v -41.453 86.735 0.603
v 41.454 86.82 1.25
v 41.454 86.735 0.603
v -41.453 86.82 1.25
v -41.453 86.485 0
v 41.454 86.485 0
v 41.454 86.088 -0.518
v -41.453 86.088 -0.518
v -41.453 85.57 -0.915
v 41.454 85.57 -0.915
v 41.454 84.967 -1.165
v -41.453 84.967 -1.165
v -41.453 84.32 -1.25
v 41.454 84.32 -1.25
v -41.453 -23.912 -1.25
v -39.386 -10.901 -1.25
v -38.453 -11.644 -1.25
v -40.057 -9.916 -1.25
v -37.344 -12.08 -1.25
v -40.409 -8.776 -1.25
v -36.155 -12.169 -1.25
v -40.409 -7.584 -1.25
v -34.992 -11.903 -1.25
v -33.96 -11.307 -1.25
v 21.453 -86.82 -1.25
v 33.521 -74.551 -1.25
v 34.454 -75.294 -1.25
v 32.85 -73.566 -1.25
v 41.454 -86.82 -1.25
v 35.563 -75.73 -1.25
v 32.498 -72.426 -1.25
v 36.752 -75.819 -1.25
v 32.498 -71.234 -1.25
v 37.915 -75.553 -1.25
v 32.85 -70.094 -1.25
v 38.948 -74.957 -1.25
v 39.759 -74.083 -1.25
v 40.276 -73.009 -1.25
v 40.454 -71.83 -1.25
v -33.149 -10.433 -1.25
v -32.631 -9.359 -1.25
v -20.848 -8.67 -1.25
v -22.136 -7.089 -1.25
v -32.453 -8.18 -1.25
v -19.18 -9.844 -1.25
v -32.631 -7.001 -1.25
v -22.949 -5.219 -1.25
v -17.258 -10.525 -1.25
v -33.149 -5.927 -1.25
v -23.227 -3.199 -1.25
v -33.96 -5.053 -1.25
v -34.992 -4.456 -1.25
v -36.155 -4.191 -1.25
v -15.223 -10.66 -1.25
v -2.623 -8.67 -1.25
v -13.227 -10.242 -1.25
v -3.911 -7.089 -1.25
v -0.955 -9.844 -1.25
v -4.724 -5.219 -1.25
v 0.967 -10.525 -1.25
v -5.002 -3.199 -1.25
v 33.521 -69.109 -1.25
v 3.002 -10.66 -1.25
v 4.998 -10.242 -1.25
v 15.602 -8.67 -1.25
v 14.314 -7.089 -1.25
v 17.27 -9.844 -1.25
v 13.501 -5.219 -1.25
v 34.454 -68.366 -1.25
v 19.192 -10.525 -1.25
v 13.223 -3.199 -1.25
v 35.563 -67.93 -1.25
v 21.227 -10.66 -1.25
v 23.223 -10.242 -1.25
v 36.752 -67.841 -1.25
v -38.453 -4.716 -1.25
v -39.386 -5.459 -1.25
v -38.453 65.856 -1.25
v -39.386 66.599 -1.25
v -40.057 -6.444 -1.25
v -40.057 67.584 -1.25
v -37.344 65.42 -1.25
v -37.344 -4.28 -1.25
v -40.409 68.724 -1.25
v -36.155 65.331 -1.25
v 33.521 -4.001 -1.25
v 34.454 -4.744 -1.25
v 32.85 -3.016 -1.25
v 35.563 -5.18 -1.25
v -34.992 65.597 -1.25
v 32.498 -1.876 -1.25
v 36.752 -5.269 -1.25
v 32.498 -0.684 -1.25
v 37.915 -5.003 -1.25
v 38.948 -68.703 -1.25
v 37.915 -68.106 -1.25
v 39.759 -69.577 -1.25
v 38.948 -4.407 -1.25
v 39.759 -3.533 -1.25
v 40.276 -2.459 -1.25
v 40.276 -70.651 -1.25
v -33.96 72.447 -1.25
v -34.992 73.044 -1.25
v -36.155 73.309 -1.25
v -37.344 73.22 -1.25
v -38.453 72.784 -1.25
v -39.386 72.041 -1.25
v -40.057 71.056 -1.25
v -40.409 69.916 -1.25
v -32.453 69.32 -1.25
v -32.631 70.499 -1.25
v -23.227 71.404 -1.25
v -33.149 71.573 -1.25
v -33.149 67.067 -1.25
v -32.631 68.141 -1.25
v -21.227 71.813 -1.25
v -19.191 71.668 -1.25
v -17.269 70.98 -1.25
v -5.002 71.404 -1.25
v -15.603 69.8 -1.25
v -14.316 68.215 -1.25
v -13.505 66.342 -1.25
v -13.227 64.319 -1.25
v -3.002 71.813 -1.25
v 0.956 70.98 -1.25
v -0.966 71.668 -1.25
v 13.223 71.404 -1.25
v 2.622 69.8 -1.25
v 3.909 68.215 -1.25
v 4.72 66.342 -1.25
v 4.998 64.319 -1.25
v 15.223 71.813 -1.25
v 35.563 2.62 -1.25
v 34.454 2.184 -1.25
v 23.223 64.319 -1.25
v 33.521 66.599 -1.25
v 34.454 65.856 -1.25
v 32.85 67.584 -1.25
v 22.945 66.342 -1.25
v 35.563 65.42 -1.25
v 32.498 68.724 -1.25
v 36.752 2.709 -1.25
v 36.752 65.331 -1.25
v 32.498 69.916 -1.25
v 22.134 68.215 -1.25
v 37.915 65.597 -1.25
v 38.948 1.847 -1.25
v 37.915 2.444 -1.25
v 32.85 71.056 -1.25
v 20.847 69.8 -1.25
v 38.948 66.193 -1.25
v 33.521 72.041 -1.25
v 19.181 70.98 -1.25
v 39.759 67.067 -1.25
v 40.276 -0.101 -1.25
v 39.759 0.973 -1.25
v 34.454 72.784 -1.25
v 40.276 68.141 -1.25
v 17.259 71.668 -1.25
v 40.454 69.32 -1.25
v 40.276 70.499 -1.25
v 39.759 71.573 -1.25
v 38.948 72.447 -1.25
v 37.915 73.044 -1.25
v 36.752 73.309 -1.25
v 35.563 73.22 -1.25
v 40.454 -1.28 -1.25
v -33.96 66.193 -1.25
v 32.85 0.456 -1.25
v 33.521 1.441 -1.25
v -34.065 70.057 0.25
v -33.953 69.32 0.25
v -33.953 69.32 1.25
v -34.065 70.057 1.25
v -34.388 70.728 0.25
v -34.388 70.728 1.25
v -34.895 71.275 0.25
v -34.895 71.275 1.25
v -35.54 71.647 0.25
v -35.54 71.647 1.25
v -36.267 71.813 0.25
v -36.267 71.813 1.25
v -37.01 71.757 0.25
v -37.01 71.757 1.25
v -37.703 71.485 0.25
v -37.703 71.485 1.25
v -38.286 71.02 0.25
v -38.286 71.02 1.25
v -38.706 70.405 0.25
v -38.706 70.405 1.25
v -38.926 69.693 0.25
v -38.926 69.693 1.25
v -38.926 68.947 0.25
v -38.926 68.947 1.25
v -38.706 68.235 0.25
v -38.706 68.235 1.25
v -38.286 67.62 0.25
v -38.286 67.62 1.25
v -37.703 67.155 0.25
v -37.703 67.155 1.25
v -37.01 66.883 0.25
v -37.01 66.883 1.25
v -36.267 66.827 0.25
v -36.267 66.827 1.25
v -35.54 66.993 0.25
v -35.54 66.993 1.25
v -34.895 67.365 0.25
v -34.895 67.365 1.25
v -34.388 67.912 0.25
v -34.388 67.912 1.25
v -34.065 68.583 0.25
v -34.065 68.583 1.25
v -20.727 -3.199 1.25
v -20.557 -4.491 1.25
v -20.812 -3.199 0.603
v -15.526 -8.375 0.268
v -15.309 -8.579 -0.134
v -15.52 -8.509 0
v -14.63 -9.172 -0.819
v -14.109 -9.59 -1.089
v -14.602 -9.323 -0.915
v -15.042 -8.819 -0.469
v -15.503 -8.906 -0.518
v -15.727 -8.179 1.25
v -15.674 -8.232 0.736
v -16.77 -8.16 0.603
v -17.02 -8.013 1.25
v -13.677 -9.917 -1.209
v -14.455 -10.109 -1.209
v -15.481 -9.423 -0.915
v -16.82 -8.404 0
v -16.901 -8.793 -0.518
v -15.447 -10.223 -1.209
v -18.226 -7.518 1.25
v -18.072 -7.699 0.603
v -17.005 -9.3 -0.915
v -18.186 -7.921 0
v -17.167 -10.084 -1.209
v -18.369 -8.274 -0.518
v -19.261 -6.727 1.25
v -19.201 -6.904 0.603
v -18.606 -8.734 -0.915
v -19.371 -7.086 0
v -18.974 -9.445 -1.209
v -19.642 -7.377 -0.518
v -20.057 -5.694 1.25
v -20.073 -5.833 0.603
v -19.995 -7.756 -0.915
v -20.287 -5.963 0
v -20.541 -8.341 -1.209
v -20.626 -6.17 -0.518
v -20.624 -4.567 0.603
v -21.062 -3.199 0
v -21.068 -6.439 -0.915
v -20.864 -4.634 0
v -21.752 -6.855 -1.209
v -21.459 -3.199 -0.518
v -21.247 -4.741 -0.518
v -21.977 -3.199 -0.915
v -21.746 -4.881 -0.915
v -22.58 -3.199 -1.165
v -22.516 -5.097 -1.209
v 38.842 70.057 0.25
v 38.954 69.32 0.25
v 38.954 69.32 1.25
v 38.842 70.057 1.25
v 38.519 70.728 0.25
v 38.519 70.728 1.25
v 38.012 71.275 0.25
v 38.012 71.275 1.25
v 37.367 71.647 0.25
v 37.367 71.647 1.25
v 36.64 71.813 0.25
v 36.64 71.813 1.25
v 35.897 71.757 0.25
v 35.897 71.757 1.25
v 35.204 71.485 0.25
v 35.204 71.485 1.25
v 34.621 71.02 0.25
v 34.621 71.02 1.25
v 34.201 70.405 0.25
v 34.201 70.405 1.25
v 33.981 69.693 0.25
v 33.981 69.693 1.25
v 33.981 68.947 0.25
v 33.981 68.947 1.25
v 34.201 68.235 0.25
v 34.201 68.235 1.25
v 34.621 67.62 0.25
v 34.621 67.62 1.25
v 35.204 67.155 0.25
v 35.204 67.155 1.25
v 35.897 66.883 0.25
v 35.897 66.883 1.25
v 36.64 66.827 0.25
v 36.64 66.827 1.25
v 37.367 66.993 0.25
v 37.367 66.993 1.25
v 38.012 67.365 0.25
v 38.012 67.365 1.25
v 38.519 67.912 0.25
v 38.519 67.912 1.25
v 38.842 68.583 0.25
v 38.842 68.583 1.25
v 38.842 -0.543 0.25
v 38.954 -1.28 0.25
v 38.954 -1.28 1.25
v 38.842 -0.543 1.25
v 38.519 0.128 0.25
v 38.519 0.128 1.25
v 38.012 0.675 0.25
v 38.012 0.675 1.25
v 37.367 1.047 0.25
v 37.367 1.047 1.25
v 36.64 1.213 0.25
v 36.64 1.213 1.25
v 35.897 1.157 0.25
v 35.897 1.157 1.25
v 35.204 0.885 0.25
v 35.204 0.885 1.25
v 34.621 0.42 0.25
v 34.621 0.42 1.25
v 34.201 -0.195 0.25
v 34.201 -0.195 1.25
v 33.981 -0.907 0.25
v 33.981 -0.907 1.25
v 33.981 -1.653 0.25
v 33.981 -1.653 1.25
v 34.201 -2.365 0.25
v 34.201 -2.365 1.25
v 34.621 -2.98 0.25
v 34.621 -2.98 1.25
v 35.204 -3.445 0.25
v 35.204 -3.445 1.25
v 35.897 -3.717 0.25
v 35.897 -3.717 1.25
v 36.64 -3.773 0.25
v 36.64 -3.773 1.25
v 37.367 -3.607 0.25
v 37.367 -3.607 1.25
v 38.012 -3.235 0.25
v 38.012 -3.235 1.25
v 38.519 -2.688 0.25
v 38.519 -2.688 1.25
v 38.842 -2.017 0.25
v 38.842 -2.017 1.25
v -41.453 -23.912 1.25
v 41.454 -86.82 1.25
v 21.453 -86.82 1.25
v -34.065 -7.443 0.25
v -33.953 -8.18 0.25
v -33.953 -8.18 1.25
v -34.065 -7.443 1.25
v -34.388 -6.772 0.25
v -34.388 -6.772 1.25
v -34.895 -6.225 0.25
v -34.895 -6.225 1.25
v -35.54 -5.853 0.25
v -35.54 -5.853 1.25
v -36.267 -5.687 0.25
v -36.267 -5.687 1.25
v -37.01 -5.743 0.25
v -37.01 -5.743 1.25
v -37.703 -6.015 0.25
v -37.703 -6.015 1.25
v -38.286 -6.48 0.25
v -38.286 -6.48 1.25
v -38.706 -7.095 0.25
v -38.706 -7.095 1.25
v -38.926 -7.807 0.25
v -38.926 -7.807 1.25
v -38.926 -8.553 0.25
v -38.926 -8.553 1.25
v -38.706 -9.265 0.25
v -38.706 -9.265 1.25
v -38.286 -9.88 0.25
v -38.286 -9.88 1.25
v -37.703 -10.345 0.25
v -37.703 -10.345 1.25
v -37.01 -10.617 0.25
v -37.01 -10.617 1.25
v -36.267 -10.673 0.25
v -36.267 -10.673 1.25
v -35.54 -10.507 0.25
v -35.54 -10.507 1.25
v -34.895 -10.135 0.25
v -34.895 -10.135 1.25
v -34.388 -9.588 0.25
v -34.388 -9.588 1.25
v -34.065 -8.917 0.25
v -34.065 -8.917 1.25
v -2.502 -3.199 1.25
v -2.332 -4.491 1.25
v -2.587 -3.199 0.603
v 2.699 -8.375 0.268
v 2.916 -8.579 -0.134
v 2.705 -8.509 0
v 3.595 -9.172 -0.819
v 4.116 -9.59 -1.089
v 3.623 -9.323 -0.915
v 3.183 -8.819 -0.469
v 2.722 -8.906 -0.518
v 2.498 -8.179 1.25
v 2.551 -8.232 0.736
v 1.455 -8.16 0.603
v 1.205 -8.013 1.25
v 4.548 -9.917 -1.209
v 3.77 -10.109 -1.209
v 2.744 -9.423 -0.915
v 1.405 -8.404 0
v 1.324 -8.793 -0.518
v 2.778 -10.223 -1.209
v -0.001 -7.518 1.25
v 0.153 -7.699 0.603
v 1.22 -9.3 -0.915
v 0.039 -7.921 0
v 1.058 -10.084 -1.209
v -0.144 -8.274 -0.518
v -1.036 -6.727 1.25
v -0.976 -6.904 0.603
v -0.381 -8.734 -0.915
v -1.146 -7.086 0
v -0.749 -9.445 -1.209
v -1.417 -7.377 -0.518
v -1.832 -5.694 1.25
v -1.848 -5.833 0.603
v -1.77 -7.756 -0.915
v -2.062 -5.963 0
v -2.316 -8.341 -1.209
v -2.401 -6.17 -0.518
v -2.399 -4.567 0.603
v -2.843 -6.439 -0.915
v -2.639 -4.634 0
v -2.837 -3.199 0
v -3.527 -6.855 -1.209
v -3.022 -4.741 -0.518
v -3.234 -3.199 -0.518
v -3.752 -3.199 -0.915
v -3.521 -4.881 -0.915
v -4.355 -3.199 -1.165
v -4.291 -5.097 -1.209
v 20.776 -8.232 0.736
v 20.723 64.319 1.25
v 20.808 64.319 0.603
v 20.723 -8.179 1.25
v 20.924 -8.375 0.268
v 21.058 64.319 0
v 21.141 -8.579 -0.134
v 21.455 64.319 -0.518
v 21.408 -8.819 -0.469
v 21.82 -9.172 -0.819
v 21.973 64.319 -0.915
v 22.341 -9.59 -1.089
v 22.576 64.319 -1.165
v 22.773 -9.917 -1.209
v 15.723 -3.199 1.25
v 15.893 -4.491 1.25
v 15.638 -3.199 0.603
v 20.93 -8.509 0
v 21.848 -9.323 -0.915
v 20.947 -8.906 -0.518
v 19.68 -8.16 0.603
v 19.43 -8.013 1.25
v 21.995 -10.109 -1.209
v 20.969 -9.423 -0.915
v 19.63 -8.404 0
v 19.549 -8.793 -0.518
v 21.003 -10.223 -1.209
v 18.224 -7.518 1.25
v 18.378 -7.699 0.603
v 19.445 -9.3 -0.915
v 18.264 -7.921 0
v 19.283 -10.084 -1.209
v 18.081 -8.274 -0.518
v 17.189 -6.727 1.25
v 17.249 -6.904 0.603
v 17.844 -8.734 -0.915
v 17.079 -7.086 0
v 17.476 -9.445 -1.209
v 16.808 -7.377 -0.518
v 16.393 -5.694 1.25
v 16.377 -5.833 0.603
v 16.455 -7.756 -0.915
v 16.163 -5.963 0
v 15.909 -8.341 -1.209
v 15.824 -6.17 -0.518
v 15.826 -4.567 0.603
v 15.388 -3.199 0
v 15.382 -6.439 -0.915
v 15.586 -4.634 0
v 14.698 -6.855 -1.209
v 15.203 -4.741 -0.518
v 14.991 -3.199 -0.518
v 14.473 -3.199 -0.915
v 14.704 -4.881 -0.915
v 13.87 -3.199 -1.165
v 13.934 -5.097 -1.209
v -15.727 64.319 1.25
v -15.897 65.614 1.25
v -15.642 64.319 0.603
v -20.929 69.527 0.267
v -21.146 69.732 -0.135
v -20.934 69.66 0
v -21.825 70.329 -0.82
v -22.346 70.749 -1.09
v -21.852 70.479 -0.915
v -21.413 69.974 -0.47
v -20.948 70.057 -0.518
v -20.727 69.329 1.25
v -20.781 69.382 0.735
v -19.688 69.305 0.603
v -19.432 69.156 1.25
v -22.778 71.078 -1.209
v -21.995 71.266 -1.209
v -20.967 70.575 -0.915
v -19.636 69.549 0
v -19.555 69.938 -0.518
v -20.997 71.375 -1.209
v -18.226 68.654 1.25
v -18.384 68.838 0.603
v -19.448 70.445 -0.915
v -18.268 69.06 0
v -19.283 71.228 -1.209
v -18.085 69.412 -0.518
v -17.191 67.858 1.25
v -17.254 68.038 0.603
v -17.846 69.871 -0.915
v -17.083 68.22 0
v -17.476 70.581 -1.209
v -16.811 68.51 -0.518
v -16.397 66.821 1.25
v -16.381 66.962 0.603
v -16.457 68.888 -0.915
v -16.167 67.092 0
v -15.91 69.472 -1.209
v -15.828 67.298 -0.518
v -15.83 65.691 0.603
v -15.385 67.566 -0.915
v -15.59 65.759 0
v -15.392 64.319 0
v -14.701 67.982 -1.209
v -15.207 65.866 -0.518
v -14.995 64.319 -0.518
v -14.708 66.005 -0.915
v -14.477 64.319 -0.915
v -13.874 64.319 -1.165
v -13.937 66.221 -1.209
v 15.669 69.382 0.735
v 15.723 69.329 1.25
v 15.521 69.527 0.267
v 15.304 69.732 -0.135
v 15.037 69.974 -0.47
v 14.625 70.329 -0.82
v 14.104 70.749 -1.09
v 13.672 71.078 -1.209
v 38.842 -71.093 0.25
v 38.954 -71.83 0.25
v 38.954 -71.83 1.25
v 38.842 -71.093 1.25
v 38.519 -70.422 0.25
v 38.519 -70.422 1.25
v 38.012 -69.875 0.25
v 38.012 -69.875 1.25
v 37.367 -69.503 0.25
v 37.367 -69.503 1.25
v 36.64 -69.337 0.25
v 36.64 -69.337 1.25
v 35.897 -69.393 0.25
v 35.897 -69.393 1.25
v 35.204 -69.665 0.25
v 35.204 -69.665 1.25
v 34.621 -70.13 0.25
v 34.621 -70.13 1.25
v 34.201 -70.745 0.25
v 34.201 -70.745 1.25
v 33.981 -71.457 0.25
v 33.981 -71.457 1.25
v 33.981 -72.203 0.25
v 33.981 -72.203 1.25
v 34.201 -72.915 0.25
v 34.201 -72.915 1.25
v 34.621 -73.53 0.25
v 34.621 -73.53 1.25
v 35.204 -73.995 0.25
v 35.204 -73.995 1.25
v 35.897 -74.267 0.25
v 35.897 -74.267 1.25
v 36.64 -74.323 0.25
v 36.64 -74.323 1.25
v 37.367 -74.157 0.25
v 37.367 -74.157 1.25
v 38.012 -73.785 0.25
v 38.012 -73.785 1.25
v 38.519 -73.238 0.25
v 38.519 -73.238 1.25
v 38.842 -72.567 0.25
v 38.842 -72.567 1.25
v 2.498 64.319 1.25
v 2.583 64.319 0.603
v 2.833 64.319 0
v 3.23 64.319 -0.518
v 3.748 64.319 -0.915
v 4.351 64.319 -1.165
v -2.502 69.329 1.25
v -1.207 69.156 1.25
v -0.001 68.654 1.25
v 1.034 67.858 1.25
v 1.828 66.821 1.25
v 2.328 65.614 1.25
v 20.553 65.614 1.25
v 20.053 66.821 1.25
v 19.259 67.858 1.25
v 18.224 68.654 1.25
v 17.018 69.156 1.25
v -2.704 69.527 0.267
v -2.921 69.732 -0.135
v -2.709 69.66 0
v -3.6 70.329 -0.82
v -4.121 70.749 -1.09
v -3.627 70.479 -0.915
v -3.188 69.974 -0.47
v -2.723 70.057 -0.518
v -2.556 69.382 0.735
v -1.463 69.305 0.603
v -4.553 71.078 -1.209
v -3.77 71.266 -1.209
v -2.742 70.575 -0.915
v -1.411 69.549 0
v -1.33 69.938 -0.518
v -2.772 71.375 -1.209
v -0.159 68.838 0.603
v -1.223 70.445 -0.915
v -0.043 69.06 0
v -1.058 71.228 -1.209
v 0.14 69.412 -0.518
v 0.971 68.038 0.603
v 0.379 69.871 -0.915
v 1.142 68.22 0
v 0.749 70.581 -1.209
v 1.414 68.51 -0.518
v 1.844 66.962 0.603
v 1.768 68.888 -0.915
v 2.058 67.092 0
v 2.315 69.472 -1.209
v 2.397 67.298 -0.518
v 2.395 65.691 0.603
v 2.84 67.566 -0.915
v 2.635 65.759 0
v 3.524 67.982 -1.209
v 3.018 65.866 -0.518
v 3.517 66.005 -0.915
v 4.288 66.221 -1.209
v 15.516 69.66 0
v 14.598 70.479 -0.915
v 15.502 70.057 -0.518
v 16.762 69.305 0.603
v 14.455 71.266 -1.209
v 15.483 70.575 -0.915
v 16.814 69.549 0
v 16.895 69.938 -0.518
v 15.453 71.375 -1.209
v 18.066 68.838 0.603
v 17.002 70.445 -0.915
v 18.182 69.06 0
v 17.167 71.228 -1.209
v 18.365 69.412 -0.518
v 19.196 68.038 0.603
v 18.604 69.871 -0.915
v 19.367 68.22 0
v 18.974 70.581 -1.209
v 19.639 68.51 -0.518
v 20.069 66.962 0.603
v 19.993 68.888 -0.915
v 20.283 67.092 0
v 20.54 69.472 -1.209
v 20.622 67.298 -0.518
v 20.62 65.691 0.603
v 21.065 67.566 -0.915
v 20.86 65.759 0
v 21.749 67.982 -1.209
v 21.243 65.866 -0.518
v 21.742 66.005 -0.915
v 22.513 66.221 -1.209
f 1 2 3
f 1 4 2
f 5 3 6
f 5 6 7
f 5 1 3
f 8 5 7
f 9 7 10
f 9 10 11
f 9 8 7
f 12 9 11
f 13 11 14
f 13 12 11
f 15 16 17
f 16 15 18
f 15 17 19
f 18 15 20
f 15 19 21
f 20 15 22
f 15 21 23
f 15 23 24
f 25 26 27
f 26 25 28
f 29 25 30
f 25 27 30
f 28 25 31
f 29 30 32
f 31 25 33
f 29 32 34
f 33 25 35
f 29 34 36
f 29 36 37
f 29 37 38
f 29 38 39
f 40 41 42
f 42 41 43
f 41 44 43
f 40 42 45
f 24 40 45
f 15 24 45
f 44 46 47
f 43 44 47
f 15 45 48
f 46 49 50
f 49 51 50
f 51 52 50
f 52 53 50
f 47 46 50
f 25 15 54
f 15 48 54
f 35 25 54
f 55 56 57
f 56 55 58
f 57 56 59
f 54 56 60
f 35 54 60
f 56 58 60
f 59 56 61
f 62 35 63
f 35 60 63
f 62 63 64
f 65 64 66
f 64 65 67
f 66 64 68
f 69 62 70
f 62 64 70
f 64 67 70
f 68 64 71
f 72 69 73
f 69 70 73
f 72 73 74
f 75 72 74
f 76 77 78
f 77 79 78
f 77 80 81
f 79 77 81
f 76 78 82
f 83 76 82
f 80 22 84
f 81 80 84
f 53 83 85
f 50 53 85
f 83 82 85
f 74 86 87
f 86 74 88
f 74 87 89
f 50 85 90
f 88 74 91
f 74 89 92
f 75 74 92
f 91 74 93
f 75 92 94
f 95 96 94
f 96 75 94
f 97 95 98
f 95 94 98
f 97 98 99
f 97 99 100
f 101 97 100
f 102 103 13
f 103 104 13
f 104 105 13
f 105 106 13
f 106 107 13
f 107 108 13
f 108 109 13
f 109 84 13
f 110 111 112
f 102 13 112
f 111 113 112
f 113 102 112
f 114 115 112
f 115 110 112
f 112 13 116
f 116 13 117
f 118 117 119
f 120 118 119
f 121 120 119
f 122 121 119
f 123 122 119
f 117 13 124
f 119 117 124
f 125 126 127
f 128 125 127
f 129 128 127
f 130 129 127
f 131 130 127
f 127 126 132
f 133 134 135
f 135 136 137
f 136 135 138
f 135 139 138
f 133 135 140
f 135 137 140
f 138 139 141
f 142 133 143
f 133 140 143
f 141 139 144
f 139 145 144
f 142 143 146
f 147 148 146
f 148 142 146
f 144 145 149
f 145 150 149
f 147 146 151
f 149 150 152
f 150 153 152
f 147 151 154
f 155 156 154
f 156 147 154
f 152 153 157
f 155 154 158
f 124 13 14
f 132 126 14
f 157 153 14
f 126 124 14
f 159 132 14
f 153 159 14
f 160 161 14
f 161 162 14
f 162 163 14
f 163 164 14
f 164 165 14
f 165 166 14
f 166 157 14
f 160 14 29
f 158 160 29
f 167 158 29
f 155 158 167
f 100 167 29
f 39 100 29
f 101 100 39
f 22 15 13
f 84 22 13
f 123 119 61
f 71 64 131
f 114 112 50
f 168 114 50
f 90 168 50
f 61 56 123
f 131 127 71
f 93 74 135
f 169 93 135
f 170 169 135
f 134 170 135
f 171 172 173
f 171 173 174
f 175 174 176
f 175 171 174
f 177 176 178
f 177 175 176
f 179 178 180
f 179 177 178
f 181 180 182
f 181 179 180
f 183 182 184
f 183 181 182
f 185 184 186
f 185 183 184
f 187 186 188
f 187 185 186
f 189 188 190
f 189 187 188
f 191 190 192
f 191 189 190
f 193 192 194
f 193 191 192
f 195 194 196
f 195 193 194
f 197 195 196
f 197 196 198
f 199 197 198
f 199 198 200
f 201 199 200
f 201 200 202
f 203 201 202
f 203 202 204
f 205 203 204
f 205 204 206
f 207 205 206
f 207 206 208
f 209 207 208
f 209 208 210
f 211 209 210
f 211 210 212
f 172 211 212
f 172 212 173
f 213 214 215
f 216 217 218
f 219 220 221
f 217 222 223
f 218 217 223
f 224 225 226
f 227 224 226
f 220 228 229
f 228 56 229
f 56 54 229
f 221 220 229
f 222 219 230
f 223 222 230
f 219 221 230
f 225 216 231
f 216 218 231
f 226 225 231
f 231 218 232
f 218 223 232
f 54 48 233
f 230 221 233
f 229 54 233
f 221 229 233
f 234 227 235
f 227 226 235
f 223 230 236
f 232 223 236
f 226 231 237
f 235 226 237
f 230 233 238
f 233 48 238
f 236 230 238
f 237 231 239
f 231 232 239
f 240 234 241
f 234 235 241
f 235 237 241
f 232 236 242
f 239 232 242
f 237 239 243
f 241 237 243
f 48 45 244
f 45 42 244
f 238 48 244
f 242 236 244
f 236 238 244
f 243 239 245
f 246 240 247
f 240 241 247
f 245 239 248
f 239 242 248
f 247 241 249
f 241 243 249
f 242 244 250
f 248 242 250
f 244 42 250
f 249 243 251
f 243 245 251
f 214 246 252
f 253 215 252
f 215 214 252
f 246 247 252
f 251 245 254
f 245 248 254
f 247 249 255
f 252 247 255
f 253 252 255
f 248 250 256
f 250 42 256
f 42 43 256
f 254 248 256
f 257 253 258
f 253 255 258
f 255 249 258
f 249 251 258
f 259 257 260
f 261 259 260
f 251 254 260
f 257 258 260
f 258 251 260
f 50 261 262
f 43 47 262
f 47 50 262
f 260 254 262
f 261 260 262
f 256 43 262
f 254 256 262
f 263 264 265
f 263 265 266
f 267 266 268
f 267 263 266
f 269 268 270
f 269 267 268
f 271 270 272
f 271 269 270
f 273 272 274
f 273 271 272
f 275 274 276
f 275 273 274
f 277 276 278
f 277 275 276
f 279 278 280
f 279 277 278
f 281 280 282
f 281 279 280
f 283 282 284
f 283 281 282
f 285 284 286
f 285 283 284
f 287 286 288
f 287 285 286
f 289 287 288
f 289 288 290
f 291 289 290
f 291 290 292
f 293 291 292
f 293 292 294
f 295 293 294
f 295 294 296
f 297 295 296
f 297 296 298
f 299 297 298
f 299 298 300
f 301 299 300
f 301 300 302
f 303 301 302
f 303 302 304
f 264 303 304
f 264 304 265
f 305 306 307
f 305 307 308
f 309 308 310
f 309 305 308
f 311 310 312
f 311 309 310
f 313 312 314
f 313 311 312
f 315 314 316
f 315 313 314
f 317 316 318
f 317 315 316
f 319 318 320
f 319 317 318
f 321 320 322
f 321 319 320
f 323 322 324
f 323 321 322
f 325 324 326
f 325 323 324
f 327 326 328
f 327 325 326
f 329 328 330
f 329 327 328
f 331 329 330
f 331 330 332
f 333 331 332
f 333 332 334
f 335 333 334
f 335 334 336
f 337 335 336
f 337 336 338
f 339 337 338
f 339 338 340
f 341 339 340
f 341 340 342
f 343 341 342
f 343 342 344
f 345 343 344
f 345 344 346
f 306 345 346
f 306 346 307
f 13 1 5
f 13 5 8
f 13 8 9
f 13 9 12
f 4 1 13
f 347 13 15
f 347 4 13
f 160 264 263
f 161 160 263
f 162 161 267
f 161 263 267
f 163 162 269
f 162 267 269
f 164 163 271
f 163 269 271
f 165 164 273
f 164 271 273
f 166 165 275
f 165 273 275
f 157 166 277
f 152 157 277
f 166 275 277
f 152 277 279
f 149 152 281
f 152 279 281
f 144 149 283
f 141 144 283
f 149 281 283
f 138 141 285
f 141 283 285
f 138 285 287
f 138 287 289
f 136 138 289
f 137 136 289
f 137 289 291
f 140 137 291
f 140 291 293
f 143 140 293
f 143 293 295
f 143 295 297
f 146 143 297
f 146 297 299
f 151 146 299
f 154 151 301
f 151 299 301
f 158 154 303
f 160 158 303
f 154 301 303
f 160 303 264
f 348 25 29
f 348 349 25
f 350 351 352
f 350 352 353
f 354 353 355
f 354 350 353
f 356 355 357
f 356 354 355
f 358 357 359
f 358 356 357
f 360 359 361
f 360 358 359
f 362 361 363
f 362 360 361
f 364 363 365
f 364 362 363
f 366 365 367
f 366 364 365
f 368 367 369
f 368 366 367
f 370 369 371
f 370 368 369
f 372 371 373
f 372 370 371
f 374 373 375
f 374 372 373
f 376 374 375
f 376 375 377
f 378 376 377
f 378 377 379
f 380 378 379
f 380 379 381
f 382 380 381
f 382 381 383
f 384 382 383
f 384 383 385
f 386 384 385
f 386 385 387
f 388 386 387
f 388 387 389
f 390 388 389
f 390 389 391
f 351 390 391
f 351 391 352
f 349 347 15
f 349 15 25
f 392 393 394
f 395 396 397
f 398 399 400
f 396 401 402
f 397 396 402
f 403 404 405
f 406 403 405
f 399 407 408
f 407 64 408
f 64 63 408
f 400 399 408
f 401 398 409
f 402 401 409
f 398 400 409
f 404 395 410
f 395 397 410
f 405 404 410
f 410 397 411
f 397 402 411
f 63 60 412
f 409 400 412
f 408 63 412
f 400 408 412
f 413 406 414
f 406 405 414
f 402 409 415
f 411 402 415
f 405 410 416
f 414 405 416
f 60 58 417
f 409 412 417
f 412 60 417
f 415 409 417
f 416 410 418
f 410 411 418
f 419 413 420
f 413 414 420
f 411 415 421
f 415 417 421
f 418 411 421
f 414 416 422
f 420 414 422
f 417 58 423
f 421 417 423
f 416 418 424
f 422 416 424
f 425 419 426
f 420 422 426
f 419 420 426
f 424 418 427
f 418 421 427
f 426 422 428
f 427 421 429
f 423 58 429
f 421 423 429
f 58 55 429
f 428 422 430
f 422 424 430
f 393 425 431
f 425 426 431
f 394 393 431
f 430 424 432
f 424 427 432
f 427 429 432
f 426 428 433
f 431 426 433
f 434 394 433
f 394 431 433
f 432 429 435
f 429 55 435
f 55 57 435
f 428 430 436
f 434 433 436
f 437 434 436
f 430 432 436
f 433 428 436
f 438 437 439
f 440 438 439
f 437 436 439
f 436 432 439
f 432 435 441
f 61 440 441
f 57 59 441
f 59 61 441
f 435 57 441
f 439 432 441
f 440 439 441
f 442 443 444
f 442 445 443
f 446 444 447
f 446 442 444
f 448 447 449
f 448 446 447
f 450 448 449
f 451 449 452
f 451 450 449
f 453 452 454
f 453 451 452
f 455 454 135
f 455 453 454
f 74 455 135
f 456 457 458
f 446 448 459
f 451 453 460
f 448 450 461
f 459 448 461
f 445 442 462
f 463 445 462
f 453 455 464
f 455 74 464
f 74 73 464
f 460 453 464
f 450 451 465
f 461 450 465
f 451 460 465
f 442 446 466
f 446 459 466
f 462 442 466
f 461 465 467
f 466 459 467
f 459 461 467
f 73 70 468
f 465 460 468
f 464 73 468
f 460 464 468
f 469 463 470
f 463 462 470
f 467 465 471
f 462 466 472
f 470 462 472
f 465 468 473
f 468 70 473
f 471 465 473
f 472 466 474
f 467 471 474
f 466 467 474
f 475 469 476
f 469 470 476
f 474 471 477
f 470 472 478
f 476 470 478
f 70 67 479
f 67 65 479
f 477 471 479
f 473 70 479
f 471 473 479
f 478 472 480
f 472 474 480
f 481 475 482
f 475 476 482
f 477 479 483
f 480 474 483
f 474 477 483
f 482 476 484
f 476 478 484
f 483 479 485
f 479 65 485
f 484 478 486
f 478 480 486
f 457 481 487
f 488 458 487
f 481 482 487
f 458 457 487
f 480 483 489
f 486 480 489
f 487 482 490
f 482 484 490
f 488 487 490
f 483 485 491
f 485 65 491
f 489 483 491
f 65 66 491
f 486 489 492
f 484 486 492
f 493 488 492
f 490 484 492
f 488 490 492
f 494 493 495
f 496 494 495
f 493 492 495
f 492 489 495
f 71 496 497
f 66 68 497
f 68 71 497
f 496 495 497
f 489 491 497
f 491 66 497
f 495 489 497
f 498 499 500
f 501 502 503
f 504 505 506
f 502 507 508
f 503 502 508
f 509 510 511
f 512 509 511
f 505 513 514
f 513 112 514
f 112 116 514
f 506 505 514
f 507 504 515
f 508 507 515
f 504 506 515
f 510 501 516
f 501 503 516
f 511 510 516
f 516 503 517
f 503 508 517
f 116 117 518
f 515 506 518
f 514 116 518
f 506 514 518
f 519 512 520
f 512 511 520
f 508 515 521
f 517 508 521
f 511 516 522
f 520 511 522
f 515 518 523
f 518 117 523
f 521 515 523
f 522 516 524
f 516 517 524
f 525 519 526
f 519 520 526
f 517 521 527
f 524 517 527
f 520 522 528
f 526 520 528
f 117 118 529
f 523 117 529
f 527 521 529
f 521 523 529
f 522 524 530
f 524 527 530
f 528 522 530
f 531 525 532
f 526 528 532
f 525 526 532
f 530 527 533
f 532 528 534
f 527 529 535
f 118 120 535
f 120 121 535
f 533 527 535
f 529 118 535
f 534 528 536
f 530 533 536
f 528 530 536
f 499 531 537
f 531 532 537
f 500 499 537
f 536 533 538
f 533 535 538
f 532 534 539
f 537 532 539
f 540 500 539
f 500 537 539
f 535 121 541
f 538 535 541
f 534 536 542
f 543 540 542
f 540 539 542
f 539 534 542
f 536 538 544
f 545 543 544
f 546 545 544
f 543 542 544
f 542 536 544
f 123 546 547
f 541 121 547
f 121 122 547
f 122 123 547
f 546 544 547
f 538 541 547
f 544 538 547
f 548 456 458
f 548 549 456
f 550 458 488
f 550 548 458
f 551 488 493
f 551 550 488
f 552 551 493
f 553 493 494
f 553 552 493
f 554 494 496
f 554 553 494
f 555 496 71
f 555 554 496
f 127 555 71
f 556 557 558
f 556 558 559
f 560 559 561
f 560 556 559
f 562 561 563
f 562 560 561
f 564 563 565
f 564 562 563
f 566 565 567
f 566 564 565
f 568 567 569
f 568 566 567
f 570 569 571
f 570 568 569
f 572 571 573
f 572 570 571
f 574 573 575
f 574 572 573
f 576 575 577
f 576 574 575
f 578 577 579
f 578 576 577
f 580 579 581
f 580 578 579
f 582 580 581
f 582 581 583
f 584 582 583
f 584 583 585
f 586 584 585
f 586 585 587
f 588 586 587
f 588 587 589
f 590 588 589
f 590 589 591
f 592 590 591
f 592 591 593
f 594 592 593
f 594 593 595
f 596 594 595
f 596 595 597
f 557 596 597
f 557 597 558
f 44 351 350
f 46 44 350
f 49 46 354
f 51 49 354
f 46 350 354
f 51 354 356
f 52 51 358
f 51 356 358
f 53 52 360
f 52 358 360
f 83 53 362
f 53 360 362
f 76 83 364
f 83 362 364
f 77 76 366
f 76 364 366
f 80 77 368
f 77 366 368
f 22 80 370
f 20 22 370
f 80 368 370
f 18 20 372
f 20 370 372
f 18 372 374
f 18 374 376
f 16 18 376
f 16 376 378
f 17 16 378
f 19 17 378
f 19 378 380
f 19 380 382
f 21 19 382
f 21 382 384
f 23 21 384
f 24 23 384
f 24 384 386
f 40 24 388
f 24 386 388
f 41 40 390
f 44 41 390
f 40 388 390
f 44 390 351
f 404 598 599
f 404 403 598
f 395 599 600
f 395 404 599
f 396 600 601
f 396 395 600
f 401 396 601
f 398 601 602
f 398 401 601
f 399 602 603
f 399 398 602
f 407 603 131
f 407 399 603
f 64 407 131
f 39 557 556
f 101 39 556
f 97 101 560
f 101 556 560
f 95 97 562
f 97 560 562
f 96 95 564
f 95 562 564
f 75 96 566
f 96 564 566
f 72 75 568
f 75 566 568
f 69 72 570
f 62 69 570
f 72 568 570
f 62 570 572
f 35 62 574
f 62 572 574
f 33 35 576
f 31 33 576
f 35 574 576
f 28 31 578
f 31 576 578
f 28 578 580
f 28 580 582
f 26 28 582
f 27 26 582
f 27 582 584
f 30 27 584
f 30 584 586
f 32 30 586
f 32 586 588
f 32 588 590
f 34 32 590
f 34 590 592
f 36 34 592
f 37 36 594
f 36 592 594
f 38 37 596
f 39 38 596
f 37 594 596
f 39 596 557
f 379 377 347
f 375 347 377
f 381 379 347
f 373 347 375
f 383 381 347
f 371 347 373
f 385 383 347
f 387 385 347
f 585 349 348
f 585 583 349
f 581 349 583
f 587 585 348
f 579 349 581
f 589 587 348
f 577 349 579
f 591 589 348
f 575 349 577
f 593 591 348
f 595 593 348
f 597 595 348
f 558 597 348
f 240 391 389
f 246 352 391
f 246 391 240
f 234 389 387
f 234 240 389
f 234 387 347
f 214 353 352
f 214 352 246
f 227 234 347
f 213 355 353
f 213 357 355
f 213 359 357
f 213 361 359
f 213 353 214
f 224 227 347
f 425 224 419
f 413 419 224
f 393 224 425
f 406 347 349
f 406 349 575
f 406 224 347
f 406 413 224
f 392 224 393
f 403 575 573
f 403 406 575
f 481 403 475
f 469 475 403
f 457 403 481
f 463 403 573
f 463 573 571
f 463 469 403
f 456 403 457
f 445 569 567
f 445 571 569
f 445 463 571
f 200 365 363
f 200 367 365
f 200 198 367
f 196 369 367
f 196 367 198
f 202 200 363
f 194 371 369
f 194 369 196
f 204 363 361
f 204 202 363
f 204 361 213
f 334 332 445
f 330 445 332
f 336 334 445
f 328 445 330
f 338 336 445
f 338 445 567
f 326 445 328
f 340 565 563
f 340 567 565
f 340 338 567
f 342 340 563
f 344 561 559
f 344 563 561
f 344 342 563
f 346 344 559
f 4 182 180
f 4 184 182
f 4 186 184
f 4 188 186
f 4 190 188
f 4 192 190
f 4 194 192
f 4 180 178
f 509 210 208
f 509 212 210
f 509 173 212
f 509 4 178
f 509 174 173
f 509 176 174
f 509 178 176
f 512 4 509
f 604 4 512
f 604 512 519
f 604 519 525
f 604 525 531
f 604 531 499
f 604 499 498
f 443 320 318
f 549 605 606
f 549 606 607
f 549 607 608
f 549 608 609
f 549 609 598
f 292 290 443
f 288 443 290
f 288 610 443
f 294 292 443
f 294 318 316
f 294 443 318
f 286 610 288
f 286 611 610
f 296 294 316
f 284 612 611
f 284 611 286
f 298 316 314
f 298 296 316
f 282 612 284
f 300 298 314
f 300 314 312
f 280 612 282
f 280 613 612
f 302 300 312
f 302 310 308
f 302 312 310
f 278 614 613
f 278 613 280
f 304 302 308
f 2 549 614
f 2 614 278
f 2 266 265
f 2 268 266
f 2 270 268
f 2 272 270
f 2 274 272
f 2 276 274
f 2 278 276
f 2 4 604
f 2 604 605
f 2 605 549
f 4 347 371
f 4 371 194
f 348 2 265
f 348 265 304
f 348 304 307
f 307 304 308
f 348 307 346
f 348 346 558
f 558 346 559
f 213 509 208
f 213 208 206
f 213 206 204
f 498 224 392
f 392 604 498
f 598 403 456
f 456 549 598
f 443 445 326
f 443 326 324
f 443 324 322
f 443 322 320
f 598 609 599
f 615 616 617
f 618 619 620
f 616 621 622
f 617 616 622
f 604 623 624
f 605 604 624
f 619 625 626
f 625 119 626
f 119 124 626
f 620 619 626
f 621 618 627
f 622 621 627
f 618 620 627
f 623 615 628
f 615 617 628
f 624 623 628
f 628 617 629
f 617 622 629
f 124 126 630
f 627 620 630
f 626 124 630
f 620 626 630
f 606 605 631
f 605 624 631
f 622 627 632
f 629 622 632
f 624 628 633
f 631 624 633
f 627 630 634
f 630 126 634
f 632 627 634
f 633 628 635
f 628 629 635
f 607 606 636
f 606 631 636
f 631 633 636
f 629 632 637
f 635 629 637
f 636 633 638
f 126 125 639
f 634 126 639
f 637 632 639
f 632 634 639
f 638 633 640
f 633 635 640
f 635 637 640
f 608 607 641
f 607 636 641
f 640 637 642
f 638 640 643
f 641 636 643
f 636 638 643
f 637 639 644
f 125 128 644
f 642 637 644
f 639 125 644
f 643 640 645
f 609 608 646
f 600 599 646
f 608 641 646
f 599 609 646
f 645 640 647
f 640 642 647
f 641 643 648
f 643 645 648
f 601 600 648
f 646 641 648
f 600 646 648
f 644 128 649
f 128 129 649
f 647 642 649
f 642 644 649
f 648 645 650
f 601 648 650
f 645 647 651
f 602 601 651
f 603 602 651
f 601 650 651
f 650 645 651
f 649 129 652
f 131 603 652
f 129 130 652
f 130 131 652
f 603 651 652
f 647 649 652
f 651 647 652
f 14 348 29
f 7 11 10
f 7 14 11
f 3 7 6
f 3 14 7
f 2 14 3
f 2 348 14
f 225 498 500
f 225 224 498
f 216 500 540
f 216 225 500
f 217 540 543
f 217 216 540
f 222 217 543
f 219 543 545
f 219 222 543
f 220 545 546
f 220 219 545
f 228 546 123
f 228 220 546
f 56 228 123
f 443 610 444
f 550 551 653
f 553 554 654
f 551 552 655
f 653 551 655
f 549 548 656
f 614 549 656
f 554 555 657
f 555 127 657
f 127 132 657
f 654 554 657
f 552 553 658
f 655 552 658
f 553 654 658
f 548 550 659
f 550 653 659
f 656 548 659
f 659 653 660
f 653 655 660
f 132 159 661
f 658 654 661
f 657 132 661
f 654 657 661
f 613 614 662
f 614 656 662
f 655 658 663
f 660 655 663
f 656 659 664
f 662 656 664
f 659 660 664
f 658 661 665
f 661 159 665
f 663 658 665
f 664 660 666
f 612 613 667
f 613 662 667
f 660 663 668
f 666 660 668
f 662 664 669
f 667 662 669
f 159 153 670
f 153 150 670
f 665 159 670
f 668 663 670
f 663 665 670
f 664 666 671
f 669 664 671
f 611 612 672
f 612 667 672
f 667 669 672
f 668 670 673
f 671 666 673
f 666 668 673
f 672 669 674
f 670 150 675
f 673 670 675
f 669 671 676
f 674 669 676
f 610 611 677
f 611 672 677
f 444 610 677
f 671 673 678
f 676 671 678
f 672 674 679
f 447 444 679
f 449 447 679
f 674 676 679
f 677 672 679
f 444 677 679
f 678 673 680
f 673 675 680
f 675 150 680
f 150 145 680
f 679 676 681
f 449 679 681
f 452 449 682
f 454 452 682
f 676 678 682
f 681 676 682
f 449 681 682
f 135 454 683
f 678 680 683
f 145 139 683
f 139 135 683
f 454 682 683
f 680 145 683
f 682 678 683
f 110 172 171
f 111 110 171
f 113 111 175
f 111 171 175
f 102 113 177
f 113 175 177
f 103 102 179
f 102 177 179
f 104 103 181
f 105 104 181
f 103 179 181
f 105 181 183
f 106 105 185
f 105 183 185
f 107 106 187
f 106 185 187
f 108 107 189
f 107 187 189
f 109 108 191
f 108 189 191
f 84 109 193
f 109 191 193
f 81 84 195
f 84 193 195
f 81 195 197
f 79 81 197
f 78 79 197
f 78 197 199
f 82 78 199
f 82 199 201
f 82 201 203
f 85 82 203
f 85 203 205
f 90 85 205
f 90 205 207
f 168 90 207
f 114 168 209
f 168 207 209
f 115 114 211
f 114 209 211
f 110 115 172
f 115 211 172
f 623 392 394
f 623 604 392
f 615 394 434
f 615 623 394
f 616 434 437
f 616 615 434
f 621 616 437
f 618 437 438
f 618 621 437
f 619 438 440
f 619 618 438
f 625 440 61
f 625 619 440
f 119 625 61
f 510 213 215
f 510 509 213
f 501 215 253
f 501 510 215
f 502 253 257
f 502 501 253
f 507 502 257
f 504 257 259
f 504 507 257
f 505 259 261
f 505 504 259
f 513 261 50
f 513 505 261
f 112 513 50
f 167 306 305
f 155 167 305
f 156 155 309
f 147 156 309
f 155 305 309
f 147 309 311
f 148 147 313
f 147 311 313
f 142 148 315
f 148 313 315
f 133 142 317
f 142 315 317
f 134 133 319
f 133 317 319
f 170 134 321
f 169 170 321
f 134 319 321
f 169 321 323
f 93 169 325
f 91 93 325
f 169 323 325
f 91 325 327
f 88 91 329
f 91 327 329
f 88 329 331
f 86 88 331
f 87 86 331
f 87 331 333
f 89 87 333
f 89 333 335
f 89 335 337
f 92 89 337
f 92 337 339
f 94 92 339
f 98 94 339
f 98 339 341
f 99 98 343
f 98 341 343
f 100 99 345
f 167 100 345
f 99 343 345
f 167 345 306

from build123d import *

# Parameters (mm, degrees)
F0_R     = 2.5
F1_DEPTH = 1.25
F2_R     = 2.49999
F3_SIZE  = 1.5


# Not quite as in the source:
# - a fillet or chamfer is up to 0.001 mm smaller than in the source, because OpenCascade refuses the exact size


with BuildPart() as f1:
    # F0 (on Top) → F1 (new body, symmetric)
    with BuildSketch(Plane.XY):
        Polygon((41.4535664022, 86.8200212717), (-41.4534695446, 86.8200212717), (-41.4534695446, -23.9119753242), (21.4531961828, -86.8199840188), (41.4535664022, -86.8199840188), align=None)
        with Locations((-36.4534695446, -8.1799787283)):
            Circle(F0_R, mode=Mode.SUBTRACT)
        with Locations((36.4535664022, -71.8299787283)):
            Circle(F0_R, mode=Mode.SUBTRACT)
        with Locations((36.4535664022, -1.2799787283)):
            Circle(F0_R, mode=Mode.SUBTRACT)
        with BuildLine():
            Line((-20.7270524408, -3.1985588427), (-20.7270524408, 69.3289190531))
            ThreePointArc((-20.7270524408, 69.3289190531), (-17.1909272701, 67.8581418384), (-15.7270524408, 64.3191536607))
            Line((-15.7270524408, 64.3191536607), (-15.7270524408, -8.1787062808))
            ThreePointArc((-15.7270524408, -8.1787062808), (-19.2613774966, -6.7270807891), (-20.7270524408, -3.1985588427))
        make_face(mode=Mode.SUBTRACT)
        with BuildLine():
            Line((-2.5020524408, -3.1985588427), (-2.5020524408, 69.3289190531))
            ThreePointArc((-2.5020524408, 69.3289190531), (1.0340727299, 67.8581418384), (2.4979475592, 64.3191536607))
            Line((2.4979475592, 64.3191536607), (2.4979475592, -8.1787062808))
            ThreePointArc((2.4979475592, -8.1787062808), (-1.0363774966, -6.7270807891), (-2.5020524408, -3.1985588427))
        make_face(mode=Mode.SUBTRACT)
        with Locations((-36.4534695446, 69.3200212717)):
            Circle(F0_R, mode=Mode.SUBTRACT)
        with BuildLine():
            Line((15.7229475592, -3.1985588427), (15.7229475592, 69.3289190531))
            ThreePointArc((15.7229475592, 69.3289190531), (19.2590727299, 67.8581418384), (20.7229475592, 64.3191536607))
            Line((20.7229475592, 64.3191536607), (20.7229475592, -8.1787062808))
            ThreePointArc((20.7229475592, -8.1787062808), (17.1886225034, -6.7270807891), (15.7229475592, -3.1985588427))
        make_face(mode=Mode.SUBTRACT)
        with Locations((36.4535664022, 69.3200212717)):
            Circle(F0_R, mode=Mode.SUBTRACT)
    extrude(amount=F1_DEPTH, both=True)

    # F2 (radius 2.5 in the source; OpenCascade refuses exactly that, so slightly less here)
    f2_edges = [f1.edges().sort_by_distance(p)[0] for p in [
        (4.8e-05, 86.820021, -1.25),
        (-2.502052, 33.06518, -1.25),
        (2.497948, 28.070224, -1.25),
        (-20.727052, 33.06518, -1.25),
        (-15.727052, 28.070224, -1.25),
        (15.722948, 33.06518, -1.25),
        (20.722948, 28.070224, -1.25),
    ]]
    fillet(f2_edges, radius=F2_R)

    # F3
    f3_edges = [f1.edges().sort_by_distance(p)[0] for p in [
        (-38.95347, 69.320021, -1.25),
        (33.953566, 69.320021, -1.25),
        (33.953566, -1.279979, -1.25),
        (-38.95347, -8.179979, -1.25),
        (33.953566, -71.829979, -1.25),
    ]]
    chamfer(f3_edges, length=F3_SIZE)


solid = f1.part
